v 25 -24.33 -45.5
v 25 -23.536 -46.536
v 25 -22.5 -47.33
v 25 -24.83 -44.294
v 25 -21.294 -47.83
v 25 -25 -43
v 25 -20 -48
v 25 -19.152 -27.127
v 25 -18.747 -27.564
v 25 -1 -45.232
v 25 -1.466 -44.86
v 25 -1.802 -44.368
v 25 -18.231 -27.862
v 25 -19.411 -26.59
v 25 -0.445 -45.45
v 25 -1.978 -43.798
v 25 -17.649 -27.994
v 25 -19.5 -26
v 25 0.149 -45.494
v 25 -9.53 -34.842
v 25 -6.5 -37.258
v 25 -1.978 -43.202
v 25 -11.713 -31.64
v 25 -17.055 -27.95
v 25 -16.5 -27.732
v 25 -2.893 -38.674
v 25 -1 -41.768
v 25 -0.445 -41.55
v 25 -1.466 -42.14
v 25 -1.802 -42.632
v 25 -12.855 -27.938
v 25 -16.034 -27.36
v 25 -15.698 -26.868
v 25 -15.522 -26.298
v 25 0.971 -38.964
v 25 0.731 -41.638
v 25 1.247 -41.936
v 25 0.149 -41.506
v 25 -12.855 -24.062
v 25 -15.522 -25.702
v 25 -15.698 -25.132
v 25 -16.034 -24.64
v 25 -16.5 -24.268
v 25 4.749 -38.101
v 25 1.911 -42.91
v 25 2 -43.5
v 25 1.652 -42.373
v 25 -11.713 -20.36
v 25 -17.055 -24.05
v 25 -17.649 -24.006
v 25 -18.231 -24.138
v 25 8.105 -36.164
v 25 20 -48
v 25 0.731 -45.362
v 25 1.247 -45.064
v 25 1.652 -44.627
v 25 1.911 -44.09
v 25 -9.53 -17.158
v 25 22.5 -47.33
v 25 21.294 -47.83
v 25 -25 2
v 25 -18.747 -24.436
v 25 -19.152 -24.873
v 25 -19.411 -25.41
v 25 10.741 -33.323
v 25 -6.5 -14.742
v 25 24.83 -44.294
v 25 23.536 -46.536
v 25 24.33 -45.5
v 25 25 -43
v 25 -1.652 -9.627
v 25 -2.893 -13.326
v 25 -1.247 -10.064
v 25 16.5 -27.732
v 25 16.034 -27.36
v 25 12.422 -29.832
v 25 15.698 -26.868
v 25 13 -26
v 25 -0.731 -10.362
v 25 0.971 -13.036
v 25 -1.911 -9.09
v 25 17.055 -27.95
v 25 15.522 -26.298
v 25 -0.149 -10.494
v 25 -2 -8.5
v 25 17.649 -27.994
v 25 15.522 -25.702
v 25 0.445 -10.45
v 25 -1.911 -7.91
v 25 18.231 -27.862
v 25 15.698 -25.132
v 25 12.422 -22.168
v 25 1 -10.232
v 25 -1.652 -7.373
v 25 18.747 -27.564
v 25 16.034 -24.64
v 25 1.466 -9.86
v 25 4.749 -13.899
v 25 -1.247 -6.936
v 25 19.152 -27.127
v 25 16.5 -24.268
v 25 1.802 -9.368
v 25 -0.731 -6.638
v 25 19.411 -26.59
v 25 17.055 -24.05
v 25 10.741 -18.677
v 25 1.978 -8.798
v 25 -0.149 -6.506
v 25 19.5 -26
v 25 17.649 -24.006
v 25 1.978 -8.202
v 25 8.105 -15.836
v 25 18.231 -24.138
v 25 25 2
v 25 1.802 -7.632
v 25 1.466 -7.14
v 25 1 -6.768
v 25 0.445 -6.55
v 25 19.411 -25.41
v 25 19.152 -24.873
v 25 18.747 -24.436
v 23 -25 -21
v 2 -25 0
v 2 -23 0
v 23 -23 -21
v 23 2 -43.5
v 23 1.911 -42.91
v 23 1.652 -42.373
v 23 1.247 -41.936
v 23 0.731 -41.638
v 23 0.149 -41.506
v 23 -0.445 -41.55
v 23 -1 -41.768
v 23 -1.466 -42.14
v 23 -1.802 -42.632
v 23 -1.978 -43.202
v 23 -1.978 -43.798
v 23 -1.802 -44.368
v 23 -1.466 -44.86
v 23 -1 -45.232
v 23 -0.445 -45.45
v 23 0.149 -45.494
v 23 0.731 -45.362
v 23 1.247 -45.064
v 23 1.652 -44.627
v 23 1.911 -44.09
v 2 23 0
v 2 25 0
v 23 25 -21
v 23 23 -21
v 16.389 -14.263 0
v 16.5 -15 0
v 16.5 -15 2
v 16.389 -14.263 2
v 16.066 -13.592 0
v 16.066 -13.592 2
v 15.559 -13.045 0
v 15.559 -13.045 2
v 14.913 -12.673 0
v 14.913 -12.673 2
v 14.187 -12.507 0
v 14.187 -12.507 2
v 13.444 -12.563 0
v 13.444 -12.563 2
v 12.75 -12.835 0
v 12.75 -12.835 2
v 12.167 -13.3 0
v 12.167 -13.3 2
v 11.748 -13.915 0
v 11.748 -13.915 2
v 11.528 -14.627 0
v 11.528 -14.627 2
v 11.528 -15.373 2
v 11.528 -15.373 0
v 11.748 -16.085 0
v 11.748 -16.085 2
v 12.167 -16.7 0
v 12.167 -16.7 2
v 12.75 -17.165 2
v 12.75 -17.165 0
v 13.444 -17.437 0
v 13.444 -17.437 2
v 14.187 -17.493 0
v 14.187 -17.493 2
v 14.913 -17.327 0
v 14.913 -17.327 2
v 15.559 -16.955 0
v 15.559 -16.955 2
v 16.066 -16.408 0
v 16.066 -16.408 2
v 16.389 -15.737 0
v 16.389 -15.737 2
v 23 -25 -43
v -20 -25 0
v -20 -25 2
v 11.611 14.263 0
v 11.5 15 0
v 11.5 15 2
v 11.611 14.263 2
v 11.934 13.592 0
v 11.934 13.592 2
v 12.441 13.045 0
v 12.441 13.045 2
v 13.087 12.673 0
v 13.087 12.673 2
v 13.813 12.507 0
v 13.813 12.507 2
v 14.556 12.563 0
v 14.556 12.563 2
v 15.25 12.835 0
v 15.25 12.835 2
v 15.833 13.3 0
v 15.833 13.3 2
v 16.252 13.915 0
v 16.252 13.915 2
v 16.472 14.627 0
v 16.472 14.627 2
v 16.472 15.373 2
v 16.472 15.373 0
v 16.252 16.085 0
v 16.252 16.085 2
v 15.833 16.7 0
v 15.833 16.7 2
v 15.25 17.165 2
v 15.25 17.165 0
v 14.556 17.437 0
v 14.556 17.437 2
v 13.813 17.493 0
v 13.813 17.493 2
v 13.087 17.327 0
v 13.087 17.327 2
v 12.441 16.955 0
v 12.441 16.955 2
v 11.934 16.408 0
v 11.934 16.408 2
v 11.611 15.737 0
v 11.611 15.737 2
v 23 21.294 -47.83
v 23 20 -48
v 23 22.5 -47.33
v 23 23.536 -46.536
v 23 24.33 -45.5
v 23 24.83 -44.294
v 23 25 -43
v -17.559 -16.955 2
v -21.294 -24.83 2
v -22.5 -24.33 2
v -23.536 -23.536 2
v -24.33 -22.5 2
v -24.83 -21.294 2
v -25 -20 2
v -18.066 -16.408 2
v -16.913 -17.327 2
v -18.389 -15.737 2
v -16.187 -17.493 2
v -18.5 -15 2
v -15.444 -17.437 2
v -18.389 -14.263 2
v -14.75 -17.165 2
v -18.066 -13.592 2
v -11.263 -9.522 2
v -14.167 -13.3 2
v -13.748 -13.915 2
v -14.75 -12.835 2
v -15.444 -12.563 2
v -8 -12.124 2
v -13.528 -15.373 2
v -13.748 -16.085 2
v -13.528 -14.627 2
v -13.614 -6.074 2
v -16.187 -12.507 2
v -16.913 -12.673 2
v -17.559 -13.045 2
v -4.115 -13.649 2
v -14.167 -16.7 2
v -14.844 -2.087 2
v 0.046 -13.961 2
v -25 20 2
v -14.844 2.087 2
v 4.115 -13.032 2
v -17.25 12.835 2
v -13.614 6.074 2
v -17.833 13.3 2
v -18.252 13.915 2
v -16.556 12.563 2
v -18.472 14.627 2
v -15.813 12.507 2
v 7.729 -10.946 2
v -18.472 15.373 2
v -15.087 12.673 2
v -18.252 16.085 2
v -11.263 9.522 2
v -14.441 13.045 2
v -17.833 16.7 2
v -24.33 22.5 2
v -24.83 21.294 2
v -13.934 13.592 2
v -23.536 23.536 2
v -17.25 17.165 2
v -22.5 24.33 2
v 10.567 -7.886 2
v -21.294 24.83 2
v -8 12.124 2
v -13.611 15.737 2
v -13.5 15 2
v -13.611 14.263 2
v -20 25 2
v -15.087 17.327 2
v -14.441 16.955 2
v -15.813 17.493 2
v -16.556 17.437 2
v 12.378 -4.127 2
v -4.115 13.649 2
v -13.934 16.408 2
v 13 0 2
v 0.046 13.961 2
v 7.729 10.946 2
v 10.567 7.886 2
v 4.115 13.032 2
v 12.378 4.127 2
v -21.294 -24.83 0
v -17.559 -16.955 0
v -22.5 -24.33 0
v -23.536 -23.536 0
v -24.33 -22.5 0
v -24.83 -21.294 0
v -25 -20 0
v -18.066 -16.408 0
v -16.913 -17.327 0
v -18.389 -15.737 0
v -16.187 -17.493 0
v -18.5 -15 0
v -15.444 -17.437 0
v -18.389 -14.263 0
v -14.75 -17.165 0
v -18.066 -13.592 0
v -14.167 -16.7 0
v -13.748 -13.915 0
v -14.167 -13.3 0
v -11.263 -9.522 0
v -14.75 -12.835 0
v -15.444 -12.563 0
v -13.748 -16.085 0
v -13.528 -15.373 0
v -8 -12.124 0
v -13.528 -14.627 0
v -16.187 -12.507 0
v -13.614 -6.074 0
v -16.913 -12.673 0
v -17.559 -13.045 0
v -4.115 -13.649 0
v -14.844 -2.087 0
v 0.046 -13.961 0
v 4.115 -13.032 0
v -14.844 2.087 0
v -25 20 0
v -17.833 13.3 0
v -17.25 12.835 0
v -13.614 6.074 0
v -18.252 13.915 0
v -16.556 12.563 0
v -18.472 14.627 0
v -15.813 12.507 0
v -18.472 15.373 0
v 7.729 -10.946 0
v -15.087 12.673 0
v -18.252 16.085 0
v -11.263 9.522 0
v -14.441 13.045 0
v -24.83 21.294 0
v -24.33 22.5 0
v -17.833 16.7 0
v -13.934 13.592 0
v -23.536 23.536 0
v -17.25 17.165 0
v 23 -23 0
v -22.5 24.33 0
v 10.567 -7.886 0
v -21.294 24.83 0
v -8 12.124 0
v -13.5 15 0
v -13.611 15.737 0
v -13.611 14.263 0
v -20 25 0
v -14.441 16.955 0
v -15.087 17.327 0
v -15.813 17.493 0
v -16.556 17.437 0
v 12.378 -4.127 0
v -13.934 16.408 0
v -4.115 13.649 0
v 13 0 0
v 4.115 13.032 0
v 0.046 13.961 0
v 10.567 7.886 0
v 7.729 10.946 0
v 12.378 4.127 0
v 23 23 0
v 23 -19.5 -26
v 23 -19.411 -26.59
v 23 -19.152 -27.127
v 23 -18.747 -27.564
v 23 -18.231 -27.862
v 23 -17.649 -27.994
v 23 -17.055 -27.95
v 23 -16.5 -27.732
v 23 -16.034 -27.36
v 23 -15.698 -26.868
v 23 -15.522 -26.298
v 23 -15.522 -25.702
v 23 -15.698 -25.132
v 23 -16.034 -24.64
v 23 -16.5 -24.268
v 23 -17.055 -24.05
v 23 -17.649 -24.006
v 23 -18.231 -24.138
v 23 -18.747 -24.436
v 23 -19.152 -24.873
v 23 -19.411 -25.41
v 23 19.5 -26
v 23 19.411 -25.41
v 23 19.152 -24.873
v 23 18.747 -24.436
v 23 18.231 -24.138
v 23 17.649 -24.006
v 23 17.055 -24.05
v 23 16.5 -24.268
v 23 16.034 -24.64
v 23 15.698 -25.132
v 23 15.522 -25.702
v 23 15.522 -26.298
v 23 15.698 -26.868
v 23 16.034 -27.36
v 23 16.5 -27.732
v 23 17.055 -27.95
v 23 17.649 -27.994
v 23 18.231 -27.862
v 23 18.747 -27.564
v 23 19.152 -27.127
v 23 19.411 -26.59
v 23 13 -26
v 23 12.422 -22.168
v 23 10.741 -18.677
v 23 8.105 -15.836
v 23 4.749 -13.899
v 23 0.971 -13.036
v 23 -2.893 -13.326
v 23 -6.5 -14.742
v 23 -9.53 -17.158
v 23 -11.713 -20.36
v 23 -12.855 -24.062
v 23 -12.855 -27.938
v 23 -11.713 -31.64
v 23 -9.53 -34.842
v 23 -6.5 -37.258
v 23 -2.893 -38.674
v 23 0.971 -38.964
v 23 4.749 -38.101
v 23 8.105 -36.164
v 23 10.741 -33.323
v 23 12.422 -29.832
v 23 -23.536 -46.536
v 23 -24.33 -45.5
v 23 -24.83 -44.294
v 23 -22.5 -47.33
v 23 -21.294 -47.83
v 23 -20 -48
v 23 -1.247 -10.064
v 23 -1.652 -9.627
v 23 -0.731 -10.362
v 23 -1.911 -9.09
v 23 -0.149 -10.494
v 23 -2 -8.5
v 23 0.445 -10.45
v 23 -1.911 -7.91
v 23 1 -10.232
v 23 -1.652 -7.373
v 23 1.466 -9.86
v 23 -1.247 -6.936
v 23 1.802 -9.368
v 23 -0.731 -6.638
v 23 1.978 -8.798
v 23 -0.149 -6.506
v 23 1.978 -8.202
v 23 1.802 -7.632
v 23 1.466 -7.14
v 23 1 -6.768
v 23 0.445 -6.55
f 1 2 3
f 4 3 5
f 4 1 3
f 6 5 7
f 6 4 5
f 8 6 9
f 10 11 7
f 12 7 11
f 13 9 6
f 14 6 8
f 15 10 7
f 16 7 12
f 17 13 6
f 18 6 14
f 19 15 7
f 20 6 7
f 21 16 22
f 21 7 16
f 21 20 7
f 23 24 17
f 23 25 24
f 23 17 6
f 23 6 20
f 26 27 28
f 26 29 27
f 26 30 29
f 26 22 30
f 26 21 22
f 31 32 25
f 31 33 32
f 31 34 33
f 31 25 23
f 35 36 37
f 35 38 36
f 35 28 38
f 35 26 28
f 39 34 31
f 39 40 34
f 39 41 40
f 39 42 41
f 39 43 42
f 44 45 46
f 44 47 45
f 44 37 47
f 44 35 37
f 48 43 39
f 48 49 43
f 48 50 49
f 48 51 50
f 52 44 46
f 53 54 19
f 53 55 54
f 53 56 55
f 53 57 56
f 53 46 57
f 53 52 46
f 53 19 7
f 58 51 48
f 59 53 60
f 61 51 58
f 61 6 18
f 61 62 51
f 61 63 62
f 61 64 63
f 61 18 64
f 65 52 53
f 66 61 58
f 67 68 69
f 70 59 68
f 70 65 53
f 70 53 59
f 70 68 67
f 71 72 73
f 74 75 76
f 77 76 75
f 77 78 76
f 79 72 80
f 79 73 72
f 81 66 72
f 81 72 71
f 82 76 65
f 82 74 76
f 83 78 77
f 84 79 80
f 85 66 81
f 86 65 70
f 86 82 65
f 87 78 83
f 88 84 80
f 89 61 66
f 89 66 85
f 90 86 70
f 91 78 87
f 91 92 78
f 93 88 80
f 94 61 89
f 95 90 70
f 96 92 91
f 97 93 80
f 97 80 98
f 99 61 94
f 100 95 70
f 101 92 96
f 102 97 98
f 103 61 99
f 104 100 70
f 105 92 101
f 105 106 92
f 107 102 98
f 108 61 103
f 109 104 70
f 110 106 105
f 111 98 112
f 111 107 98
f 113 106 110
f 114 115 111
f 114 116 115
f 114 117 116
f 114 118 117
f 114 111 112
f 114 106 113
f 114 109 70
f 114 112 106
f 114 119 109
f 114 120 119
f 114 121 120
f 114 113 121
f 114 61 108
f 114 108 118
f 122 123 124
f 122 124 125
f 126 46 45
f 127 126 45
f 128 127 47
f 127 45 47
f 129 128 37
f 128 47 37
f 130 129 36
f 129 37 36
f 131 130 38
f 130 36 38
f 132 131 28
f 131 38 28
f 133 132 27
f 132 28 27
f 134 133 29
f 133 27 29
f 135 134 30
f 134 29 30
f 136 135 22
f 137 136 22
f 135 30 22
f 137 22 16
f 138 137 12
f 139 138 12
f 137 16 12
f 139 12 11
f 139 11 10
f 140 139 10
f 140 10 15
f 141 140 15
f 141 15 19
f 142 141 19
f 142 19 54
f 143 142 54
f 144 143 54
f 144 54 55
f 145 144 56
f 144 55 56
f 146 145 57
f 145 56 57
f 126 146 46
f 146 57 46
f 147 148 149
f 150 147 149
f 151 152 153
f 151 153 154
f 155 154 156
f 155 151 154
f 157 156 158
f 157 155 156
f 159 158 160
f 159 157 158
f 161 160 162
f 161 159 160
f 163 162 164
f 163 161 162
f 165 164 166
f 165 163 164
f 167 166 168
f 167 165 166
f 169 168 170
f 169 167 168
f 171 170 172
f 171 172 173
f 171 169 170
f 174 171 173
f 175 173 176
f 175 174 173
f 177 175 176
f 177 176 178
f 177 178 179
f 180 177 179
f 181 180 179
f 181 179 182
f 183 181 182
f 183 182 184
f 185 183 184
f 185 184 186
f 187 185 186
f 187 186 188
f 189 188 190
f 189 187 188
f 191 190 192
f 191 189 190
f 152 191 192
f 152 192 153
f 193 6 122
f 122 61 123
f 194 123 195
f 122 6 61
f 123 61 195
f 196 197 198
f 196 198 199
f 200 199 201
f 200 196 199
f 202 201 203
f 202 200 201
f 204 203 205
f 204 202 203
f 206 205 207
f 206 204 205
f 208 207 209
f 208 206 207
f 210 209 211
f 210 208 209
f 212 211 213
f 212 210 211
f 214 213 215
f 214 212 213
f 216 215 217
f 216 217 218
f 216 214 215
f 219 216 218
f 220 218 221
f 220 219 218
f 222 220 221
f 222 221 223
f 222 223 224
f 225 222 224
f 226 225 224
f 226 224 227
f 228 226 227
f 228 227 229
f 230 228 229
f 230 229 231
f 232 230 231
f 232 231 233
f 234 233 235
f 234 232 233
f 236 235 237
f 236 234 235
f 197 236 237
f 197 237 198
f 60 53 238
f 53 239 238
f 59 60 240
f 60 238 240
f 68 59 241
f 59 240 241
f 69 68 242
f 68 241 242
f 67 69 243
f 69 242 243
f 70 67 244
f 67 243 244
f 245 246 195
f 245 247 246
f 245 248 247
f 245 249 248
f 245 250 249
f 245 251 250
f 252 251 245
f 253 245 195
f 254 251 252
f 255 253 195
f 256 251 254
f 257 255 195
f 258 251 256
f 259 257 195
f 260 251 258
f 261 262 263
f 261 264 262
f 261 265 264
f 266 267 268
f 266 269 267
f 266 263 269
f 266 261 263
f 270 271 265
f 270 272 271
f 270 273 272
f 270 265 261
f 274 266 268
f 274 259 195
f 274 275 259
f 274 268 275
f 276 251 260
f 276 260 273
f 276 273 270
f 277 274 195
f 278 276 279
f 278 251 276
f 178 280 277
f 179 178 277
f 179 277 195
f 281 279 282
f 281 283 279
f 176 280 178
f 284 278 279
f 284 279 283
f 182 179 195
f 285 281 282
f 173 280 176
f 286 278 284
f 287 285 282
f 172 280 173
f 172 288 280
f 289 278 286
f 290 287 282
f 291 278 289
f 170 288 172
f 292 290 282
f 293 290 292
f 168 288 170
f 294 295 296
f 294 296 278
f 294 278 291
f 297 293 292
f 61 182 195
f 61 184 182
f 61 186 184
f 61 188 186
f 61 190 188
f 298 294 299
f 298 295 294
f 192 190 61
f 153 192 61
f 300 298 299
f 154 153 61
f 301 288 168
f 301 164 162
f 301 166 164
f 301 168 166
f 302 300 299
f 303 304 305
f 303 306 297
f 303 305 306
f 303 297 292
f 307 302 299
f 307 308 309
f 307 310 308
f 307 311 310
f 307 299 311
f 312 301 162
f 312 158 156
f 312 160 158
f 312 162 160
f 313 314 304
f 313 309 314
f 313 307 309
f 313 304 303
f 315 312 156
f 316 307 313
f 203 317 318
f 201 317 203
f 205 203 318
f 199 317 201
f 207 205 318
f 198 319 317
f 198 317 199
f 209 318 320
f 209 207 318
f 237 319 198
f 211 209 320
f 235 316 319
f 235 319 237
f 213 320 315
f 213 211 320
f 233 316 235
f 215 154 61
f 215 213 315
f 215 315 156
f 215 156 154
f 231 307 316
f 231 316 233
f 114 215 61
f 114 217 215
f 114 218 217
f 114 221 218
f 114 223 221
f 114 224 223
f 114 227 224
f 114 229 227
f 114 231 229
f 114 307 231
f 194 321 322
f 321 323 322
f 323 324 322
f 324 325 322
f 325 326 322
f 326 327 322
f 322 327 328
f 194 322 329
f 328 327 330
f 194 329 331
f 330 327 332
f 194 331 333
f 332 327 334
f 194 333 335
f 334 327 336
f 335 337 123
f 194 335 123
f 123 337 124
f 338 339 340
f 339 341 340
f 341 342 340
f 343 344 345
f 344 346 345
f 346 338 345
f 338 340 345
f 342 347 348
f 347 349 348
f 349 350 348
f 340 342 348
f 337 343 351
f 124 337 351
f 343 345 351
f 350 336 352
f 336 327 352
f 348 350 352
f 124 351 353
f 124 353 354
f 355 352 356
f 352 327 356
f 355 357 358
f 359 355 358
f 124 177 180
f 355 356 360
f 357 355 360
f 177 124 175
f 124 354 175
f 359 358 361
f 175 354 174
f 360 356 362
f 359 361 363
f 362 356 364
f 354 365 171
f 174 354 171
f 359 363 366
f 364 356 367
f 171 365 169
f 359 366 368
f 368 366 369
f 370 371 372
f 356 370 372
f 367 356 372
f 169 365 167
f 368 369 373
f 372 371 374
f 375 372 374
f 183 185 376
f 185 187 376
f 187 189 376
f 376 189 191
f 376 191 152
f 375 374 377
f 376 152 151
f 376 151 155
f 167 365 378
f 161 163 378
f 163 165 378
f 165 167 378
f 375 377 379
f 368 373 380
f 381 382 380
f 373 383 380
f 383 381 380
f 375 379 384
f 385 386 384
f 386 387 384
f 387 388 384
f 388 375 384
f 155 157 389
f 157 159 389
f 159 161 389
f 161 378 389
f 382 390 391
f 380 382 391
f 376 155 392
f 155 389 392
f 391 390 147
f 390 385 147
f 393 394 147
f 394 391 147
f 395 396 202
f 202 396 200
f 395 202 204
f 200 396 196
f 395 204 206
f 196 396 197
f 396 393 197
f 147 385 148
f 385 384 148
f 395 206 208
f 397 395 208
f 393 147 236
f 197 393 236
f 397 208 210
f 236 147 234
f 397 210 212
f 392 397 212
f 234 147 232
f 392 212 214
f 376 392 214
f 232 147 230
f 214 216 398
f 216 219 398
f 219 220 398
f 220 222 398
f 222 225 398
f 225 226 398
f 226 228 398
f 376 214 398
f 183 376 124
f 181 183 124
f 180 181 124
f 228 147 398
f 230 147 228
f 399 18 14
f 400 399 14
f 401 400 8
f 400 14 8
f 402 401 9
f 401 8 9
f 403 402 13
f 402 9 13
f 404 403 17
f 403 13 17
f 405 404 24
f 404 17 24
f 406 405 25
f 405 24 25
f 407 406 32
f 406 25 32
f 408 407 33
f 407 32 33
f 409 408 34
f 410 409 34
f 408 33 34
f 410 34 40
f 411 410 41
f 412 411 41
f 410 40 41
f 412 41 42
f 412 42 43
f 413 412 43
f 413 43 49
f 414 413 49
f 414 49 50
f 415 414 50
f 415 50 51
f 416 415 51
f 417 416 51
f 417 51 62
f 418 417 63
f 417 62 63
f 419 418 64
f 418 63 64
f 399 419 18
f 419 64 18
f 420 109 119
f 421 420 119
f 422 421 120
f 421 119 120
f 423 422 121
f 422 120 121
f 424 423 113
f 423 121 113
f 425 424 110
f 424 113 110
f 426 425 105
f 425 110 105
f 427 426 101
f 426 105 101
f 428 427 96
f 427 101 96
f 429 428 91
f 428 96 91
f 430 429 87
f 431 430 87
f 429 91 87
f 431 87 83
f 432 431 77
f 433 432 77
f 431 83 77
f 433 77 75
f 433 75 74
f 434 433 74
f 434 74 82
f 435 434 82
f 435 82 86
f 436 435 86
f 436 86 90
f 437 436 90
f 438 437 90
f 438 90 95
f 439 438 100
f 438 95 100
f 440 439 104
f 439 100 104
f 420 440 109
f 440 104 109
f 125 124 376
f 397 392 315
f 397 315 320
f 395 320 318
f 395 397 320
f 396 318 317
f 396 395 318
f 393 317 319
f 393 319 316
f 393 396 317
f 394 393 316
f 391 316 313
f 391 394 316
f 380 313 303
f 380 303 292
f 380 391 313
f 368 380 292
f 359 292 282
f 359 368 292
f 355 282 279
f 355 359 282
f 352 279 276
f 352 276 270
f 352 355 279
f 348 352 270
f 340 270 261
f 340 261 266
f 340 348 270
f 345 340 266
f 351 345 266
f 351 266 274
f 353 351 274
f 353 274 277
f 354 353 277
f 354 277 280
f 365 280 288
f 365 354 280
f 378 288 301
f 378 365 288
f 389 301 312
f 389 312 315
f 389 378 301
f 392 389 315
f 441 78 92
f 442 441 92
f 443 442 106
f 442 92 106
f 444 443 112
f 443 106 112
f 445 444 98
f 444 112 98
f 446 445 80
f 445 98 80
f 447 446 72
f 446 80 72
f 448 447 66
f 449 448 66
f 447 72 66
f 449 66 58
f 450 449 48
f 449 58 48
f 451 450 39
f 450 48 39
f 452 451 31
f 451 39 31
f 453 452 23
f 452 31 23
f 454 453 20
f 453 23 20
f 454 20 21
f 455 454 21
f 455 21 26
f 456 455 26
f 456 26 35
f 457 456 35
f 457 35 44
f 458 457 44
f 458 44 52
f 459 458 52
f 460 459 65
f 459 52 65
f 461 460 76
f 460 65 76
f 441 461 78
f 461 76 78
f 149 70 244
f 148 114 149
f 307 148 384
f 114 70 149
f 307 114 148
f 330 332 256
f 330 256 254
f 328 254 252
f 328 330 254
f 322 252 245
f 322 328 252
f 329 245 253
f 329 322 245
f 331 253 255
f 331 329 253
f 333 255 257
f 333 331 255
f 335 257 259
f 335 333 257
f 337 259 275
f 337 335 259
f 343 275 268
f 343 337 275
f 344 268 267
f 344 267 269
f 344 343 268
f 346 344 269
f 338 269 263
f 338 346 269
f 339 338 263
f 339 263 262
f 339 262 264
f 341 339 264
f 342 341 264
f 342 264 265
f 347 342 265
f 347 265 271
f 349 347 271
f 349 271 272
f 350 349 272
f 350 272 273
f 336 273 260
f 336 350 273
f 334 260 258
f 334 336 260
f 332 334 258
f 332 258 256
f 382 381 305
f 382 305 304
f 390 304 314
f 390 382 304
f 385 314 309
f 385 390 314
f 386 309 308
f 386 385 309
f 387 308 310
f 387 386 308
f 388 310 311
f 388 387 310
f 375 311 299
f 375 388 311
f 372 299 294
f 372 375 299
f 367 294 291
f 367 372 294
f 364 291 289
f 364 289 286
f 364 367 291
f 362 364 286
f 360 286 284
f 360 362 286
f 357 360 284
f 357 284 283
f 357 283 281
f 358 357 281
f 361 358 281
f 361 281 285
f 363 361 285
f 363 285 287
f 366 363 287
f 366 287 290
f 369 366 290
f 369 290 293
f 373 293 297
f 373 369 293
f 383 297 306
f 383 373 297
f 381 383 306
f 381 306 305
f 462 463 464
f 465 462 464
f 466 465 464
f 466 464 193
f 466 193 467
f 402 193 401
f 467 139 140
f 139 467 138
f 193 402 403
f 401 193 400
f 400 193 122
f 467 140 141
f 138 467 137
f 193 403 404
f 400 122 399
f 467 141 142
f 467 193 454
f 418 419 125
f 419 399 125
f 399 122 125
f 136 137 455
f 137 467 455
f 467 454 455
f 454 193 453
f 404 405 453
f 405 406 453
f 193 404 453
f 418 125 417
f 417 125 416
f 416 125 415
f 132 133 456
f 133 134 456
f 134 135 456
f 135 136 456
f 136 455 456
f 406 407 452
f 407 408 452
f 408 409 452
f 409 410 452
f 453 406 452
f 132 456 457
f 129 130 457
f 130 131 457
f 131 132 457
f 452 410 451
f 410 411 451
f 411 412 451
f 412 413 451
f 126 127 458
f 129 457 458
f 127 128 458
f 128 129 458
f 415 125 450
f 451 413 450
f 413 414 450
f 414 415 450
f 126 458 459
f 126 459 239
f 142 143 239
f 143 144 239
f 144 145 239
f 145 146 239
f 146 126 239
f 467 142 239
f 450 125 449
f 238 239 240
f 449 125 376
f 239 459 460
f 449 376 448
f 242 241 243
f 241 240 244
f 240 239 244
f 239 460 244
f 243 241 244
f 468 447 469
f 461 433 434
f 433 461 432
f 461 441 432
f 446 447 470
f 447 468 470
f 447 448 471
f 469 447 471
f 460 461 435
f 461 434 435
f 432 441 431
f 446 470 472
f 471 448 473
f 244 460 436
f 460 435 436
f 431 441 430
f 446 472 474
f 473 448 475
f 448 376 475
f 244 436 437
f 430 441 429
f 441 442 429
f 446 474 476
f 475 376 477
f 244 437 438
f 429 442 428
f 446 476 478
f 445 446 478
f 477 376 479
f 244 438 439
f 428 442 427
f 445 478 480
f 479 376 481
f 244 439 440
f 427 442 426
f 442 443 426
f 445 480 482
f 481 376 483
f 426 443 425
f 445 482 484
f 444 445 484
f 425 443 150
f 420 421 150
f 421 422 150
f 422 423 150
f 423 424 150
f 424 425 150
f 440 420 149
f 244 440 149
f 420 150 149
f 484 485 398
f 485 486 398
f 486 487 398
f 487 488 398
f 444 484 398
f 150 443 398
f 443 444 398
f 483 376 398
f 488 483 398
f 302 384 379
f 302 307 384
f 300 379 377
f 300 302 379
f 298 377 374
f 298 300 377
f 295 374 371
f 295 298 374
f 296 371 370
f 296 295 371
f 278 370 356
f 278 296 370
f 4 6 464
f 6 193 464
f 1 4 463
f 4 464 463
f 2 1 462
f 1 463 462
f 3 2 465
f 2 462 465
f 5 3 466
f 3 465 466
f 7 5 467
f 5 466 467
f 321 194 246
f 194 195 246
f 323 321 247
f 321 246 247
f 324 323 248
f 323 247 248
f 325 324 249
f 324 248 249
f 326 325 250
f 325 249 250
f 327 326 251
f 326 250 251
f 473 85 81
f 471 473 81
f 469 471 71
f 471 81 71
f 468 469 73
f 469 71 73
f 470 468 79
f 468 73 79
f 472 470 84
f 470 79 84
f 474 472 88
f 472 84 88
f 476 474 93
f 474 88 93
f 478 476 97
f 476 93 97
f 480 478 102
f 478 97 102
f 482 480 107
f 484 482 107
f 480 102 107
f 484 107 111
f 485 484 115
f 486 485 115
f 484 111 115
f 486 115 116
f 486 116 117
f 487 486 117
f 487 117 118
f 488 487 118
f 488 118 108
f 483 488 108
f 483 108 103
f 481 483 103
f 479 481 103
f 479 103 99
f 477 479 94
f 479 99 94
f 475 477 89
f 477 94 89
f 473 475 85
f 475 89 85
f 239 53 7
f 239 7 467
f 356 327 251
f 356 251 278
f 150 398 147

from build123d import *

# Parameters (mm, degrees)
SKETCH_1_W          = 50
SKETCH_1_H          = 50
SKETCH_1_R          = 14
SKETCH_1_R_2        = 2.5
EXTRUDE_1_DEPTH     = 2
SKETCH_3_W          = 2
SKETCH_3_H          = 50
EXTRUDE_3_DEPTH     = 48
EXTRUDE_4_DEPTH     = 2
EXTRUDE_5_DEPTH     = 2
SKETCH_6_R          = 13
SKETCH_6_R_2        = 2
CUT_EXTRUDE_1_DEPTH = 2
FILLET_1_R          = 5


with BuildPart() as part:
    # 草图1 → 凸台-拉伸1 (new body)
    with BuildSketch(Plane.XY):
        Rectangle(SKETCH_1_W, SKETCH_1_H)
        with Locations((-1, 0)):
            Circle(SKETCH_1_R, mode=Mode.SUBTRACT)
        with Locations((-16, 15)):
            Circle(SKETCH_1_R_2, mode=Mode.SUBTRACT)
        with Locations(Location((-16, -15, 0), (0, 0, 180))):
            Circle(SKETCH_1_R_2, mode=Mode.SUBTRACT)
        with Locations((14, -15)):
            Circle(SKETCH_1_R_2, mode=Mode.SUBTRACT)
        with Locations(Location((14, 15, 0), (0, 0, 180))):
            Circle(SKETCH_1_R_2, mode=Mode.SUBTRACT)
    extrude(amount=EXTRUDE_1_DEPTH)

    # 草图3 → 凸台-拉伸3 (add)
    with BuildSketch(Plane(origin=(0, 0, 0), x_dir=(-1, 0, 0), z_dir=(0, 0, -1))):
        with Locations((-24, 0)):
            Rectangle(SKETCH_3_W, SKETCH_3_H)
    extrude(amount=EXTRUDE_3_DEPTH)

    # 草图4 → 凸台-拉伸4 (add)
    with BuildSketch(Plane(origin=(0, 25, 0), x_dir=(1, 0, 0), z_dir=(0, 1, 0))):
        Polygon((0, -2), (25, 23), (25, -2), align=None)
    extrude(amount=-EXTRUDE_4_DEPTH)

    # 草图5 → 凸台-拉伸5 (add)
    with BuildSketch(Plane.XZ.offset(25)):
        Polygon((25, 2), (0, 2), (25, -23), align=None)
    extrude(amount=-EXTRUDE_5_DEPTH)

    # 草图6 → 切除-拉伸1 (cut)
    with BuildSketch(Plane(origin=(25, 0, 0), x_dir=(0, 0, -1), z_dir=(1, 0, 0))):
        with Locations(Location((26, 0, 0), (0, 0, 90))):
            Circle(SKETCH_6_R)
        with Locations(Location((43.5, 0, 0), (0, 0, 90))):
            Circle(SKETCH_6_R_2)
        with Locations(Location((26, 17.5, 0), (0, 0, 90))):
            Circle(SKETCH_6_R_2)
        with Locations(Location((26, -17.5, 0), (0, 0, 270))):
            Circle(SKETCH_6_R_2)
        with Locations(Location((8.5, 0, 0), (0, 0, 270))):
            Circle(SKETCH_6_R_2)
    extrude(amount=-CUT_EXTRUDE_1_DEPTH, mode=Mode.SUBTRACT)

    # 圆角1
    fillet_1_edges = [part.edges().sort_by_distance(p)[0] for p in [
        (24, -25, -48),
        (24, 25, -48),
        (-25, -25, 1),
        (-25, 25, 1),
    ]]
    fillet(fillet_1_edges, radius=FILLET_1_R)


solid = part.part
